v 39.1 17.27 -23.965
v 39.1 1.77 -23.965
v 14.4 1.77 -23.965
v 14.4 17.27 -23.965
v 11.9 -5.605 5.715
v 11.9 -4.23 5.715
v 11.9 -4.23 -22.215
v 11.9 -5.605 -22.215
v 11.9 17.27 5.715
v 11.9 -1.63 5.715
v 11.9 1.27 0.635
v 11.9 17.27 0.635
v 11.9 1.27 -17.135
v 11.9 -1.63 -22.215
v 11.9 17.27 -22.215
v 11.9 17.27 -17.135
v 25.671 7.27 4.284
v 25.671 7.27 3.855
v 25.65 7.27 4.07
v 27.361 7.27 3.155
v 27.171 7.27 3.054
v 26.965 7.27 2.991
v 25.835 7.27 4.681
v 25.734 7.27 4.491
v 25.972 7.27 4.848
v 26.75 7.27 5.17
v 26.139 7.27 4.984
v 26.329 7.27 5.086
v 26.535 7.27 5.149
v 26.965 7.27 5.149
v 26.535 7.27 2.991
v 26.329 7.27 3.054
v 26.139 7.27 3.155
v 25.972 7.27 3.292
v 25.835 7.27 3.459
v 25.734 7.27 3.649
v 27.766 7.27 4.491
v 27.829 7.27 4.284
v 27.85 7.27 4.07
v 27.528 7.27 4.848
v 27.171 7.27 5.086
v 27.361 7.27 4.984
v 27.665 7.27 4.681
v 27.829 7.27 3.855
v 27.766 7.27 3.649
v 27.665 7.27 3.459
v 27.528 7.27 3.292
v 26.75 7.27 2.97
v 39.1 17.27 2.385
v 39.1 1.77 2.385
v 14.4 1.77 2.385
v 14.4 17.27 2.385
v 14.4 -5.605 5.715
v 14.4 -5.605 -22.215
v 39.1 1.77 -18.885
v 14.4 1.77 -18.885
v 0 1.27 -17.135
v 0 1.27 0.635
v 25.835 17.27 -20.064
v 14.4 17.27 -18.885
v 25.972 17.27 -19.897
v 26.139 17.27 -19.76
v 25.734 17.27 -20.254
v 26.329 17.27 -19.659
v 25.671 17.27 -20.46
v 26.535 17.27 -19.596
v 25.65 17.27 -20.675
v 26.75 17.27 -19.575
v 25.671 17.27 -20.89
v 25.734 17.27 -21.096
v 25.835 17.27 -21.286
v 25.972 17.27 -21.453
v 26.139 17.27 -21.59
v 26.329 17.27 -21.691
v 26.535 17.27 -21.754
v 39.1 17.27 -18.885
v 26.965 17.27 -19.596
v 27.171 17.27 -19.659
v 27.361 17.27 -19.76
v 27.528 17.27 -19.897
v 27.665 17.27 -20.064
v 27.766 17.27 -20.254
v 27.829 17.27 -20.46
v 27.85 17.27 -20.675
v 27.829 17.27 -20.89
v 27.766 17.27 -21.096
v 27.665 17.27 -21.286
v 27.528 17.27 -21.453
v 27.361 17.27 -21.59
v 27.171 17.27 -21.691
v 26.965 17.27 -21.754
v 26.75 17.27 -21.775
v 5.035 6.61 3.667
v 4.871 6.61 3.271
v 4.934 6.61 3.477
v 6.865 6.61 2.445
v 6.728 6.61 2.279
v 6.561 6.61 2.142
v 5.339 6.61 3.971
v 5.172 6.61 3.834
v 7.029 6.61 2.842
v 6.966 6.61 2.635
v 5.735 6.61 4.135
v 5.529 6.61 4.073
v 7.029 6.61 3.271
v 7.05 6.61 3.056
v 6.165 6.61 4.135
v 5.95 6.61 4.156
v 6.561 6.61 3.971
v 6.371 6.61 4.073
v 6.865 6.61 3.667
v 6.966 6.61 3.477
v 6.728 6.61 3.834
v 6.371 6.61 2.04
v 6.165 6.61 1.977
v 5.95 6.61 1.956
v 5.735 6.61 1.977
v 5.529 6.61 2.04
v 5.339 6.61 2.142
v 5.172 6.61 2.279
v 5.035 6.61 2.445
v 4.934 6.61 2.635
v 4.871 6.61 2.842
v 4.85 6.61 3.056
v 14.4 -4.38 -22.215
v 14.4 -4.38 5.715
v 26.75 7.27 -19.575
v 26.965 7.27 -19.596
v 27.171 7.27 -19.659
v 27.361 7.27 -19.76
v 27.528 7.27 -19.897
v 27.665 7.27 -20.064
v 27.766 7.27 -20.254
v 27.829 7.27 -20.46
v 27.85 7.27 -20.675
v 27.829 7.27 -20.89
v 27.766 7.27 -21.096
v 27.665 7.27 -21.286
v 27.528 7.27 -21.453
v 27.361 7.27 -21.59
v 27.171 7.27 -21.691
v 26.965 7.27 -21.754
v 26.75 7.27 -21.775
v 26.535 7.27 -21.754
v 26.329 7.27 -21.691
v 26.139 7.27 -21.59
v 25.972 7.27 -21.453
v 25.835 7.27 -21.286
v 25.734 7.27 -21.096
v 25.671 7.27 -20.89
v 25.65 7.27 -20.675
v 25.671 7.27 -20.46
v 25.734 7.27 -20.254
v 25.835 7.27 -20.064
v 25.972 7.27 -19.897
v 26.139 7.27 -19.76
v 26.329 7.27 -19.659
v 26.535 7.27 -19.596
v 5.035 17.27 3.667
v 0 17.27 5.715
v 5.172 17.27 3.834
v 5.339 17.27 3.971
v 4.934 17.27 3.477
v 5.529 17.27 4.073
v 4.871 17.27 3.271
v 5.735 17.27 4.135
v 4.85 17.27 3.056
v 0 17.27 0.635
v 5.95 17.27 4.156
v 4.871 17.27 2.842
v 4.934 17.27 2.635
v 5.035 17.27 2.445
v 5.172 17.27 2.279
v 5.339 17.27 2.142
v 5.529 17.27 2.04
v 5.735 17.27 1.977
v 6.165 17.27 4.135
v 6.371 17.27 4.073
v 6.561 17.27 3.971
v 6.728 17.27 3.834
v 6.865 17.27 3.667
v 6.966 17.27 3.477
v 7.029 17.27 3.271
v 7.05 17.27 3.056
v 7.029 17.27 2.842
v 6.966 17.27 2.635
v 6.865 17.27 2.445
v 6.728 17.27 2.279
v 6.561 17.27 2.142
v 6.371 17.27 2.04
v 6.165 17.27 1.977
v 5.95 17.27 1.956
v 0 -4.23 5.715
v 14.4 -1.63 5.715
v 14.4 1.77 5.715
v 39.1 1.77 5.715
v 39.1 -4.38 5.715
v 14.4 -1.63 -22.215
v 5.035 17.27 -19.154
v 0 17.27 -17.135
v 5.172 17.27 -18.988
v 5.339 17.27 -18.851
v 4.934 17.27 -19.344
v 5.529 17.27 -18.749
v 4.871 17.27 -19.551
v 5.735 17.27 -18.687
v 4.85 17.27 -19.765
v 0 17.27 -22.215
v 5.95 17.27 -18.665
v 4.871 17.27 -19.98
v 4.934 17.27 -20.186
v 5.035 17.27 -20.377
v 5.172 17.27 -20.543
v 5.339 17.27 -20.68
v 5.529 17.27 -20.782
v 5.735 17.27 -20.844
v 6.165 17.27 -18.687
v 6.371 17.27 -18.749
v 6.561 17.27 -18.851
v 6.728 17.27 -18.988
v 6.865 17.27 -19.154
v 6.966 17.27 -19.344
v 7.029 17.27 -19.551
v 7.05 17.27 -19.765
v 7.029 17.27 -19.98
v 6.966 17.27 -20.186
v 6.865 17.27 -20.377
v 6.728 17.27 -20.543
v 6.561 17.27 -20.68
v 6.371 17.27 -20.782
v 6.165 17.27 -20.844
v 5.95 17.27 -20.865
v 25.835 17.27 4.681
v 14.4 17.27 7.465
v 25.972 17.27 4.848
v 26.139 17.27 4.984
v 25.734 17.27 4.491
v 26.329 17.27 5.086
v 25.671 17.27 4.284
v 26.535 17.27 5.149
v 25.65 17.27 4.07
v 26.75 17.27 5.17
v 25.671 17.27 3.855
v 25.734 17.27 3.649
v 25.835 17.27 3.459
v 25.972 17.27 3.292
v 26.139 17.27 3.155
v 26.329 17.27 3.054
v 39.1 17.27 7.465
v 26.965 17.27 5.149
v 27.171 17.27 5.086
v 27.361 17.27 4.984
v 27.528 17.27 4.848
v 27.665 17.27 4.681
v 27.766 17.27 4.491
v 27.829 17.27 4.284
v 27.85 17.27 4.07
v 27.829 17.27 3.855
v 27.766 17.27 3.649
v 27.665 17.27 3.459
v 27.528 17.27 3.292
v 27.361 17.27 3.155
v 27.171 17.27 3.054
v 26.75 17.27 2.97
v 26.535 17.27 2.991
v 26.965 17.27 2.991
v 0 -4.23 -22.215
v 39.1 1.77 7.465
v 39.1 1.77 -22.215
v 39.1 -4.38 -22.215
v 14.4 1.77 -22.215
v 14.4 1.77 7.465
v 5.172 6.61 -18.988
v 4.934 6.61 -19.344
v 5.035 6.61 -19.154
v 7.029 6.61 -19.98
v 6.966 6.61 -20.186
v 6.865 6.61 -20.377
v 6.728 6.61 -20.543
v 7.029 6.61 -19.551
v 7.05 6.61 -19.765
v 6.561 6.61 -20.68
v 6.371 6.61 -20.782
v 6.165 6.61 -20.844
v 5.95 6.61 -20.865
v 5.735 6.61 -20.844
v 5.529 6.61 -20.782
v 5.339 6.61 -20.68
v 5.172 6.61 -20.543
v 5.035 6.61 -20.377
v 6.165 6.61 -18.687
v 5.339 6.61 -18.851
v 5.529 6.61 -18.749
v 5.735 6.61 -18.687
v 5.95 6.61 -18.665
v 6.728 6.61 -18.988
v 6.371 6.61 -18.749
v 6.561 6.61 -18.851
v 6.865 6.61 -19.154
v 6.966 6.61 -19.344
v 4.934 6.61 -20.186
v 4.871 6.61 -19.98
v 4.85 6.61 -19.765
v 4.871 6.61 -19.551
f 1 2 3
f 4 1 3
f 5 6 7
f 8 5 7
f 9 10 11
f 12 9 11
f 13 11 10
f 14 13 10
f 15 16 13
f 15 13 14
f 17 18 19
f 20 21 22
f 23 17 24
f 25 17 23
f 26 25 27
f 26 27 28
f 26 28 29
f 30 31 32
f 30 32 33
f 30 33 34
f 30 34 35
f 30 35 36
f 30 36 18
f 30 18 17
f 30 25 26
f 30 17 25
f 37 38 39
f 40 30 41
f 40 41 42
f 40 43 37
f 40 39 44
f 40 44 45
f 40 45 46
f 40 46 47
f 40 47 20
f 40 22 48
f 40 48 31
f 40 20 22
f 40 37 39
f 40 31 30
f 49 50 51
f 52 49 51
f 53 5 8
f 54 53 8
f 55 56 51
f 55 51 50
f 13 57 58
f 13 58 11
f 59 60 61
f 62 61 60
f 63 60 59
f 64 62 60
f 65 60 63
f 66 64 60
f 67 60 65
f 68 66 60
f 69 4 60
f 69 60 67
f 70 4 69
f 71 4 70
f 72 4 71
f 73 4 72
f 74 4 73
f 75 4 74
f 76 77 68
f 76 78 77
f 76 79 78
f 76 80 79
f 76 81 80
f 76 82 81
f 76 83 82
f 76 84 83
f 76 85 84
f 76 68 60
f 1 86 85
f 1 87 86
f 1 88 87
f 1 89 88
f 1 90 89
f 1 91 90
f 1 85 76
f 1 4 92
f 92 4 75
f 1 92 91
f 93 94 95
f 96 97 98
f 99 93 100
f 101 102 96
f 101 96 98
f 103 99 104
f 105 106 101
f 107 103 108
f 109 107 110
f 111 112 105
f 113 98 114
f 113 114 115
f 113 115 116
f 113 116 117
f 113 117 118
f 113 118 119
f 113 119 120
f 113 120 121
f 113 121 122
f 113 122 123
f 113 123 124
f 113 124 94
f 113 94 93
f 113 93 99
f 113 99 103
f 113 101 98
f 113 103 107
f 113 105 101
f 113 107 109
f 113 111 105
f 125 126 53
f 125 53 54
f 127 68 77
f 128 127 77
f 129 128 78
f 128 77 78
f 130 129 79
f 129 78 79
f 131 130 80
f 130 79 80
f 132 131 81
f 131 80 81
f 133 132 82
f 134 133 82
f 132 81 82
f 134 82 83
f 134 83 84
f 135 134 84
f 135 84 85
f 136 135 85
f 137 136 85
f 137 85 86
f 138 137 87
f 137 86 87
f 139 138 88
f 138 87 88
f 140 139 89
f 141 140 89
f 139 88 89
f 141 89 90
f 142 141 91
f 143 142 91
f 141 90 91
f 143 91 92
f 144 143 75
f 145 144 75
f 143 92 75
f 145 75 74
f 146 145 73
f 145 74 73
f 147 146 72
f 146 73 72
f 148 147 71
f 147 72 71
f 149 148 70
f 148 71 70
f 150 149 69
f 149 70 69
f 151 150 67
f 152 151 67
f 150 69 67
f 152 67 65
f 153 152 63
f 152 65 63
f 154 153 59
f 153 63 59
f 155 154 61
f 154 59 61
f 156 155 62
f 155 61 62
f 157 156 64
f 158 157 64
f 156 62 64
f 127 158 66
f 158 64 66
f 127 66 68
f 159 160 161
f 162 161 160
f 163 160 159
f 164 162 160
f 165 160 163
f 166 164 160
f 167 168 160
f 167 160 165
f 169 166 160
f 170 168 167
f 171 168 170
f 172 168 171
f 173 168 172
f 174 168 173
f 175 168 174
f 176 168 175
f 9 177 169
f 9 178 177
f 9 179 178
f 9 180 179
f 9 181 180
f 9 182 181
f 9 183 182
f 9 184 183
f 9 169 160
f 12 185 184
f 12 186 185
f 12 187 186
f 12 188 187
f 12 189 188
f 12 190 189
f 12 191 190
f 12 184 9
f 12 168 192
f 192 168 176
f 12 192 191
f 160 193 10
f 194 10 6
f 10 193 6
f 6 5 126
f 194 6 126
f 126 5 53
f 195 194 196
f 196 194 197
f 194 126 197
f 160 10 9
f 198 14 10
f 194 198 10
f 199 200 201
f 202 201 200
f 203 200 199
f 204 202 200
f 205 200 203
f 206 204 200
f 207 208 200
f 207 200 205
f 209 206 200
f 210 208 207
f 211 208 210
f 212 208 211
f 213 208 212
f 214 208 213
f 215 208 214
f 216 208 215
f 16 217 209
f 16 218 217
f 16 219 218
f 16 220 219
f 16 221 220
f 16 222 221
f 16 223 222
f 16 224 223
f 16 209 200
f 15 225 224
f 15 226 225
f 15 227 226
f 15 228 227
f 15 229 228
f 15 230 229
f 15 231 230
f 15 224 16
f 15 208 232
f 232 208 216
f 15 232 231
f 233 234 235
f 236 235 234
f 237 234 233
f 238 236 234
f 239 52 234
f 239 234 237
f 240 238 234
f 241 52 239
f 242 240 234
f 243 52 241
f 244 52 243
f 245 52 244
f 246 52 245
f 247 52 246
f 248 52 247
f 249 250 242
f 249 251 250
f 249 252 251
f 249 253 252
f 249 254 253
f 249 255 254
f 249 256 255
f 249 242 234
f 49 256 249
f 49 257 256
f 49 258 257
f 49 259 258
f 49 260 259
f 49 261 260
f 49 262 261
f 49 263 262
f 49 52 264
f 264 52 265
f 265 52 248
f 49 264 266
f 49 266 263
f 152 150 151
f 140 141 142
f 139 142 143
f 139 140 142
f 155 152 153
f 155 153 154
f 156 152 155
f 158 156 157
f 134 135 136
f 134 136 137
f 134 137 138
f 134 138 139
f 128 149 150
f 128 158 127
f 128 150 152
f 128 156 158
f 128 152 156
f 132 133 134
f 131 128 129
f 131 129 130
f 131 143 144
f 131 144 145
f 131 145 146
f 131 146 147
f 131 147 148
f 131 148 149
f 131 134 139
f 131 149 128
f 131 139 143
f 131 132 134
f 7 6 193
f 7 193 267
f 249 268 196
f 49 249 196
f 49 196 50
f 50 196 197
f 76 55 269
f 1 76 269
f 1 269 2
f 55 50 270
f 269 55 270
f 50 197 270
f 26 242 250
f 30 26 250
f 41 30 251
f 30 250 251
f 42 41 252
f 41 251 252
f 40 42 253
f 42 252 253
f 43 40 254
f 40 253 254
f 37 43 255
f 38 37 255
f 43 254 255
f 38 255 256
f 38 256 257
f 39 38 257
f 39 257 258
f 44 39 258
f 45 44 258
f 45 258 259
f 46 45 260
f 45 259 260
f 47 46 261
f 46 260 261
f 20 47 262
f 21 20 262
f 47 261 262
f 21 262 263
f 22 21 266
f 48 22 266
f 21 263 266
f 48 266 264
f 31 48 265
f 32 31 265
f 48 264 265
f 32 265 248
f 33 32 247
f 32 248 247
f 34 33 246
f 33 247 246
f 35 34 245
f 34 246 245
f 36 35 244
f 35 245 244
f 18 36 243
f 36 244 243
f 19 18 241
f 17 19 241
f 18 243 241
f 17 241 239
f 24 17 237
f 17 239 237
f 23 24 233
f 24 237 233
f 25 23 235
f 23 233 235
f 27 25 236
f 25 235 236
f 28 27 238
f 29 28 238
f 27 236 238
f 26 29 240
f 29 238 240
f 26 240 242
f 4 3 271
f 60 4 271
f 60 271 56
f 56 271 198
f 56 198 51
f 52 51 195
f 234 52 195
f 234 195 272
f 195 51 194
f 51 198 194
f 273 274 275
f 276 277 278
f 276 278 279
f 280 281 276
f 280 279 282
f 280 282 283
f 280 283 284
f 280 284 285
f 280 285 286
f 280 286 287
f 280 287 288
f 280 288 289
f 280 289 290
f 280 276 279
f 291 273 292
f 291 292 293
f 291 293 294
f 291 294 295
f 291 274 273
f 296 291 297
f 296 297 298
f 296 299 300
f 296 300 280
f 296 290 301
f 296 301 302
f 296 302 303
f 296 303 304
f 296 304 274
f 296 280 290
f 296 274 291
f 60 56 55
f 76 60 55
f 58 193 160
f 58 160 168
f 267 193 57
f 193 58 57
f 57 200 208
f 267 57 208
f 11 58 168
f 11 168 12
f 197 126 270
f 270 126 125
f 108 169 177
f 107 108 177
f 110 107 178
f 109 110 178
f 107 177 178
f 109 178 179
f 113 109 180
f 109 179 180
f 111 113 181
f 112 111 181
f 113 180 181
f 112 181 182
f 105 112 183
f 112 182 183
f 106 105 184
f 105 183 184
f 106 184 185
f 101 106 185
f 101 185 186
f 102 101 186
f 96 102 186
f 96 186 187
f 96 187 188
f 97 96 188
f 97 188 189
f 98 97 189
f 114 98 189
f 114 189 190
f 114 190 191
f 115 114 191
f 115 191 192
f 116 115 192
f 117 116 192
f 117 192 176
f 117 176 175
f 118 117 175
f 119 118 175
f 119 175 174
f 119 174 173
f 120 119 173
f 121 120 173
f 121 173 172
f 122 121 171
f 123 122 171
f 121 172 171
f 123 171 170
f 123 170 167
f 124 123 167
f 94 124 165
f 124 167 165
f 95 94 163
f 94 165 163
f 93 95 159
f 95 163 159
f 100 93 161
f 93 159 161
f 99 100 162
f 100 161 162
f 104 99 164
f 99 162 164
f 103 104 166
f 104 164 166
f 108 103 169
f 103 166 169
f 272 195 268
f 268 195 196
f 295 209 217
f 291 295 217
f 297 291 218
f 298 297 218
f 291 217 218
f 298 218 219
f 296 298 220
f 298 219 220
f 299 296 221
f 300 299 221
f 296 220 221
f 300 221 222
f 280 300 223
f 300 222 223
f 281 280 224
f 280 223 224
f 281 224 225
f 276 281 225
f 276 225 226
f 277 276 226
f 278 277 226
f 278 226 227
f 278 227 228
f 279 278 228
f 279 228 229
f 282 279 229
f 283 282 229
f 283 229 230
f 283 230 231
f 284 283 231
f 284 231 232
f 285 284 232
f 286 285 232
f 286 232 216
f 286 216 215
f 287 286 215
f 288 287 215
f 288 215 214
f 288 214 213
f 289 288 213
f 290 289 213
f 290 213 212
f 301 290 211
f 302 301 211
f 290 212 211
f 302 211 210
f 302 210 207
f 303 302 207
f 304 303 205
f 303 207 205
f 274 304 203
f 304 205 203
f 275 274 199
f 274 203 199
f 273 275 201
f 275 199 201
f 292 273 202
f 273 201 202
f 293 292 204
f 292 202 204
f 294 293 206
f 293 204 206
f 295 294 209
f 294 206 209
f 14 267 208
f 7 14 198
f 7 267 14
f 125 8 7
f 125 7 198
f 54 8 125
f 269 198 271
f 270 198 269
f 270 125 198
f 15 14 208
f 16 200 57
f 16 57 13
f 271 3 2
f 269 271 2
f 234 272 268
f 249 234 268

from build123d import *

# Parameters (mm, degrees)
SKETCH1_W            = 11.9
SKETCH1_H            = 27.93
BOSS_EXTRUDE1_DEPTH  = 1.27
SKETCH1_3_W          = 11.9
SKETCH1_3_H          = 5.08
BOSS_EXTRUDE2_DEPTH  = 16.77
SKETCH2_R            = 1.1
CUT_EXTRUDE1_DEPTH   = 10.16
SKETCH3_R            = 1.1
CUT_EXTRUDE2_DEPTH   = 10.16
SKETCH4_W            = 27.93
SKETCH4_H            = 1.48
BOSS_EXTRUDE4_DEPTH  = 11.9
SKETCH6_W            = 27.93
SKETCH6_H            = 2.75
BOSS_EXTRUDE5_DEPTH  = 11.9
SKETCH7_W            = 27.93
SKETCH7_H            = 2.75
BOSS_EXTRUDE6_DEPTH  = 2.5
BOSS_EXTRUDE7_DEPTH  = 2.5
BOSS_EXTRUDE13_START = 0.5
SKETCH19_W           = 11.9
SKETCH19_H           = 5.08
SKETCH19_R           = 1.1
BOSS_EXTRUDE13_DEPTH = 0.5
BOSS_EXTRUDE14_DEPTH = 24.7
SKETCH21_W           = 24.7
SKETCH21_H           = 27.93
BOSS_EXTRUDE16_DEPTH = 0.5
SKETCH23_W           = 24.7
SKETCH23_H           = 5.08
BOSS_EXTRUDE17_DEPTH = 15.5
SKETCH24_R           = 1.1
CUT_EXTRUDE3_DEPTH   = 10


with BuildPart() as part:
    # Sketch1 → Boss-Extrude1 (new body)
    with BuildSketch(Plane(origin=(0, 0, 0), x_dir=(1, 0, 0), z_dir=(0, 1, 0))):
        with Locations((5.95, 8.25)):
            Rectangle(SKETCH1_W, SKETCH1_H)
    extrude(amount=BOSS_EXTRUDE1_DEPTH)

    # Sketch1<3> → Boss-Extrude2 (add)
    with BuildSketch(Plane(origin=(0, 0, 0), x_dir=(1, 0, 0), z_dir=(0, 1, 0))):
        with Locations((5.95, 19.675)):
            Rectangle(SKETCH1_3_W, SKETCH1_3_H)
        with Locations((5.95, -3.175)):
            Rectangle(SKETCH1_3_W, SKETCH1_3_H)
    extrude(amount=BOSS_EXTRUDE2_DEPTH)

    # Sketch2 → Cut-Extrude1 (cut)
    with BuildSketch(Plane(origin=(0, 16.77, 0), x_dir=(1, 0, 0), z_dir=(0, 1, 0))):
        with Locations((5.95, 19.765430595)):
            Circle(SKETCH2_R)
    extrude(amount=-CUT_EXTRUDE1_DEPTH, mode=Mode.SUBTRACT)

    # Sketch3 → Cut-Extrude2 (cut)
    with BuildSketch(Plane(origin=(0, 16.77, 0), x_dir=(1, 0, 0), z_dir=(0, 1, 0))):
        with Locations((5.95, -3.056330688)):
            Circle(SKETCH3_R)
    extrude(amount=-CUT_EXTRUDE2_DEPTH, mode=Mode.SUBTRACT)

    # Sketch4 → Boss-Extrude4 (add)
    with BuildSketch(Plane(origin=(11.9, 0, 0), x_dir=(0, 0, -1), z_dir=(1, 0, 0))):
        with Locations((8.25, -0.74)):
            Rectangle(SKETCH4_W, SKETCH4_H)
    extrude(amount=-BOSS_EXTRUDE4_DEPTH)

    # Sketch6 → Boss-Extrude5 (add)
    with BuildSketch(Plane(origin=(11.9, 0, 0), x_dir=(0, 0, -1), z_dir=(1, 0, 0))):
        with Locations((8.25, -2.855)):
            Rectangle(SKETCH6_W, SKETCH6_H)
    extrude(amount=-BOSS_EXTRUDE5_DEPTH)

    # Sketch7 → Boss-Extrude6 (add)
    with BuildSketch(Plane(origin=(11.9, 0, 0), x_dir=(0, 0, -1), z_dir=(1, 0, 0))):
        with Locations((8.25, -4.23)):
            Rectangle(SKETCH7_W, SKETCH7_H)
    extrude(amount=BOSS_EXTRUDE6_DEPTH)

    # Sketch8 → Boss-Extrude7 (add)
    with BuildSketch(Plane(origin=(11.9, 0, 0), x_dir=(0, 0, -1), z_dir=(1, 0, 0))):
        Polygon((22.215, -1.63), (-0.635, -1.63), (-5.715, -1.63), (-5.715, -2.855), (22.215, -2.855), align=None)
    extrude(amount=BOSS_EXTRUDE7_DEPTH)

    # Sketch19 → Boss-Extrude13 (add)
    # profile 1 of 2: a face of its own
    with BuildSketch(Plane(origin=(0, 16.77, 0), x_dir=(1, 0, 0), z_dir=(0, 1, 0)).offset(BOSS_EXTRUDE13_START)):
        with Locations((5.95, 19.675)):
            Rectangle(SKETCH19_W, SKETCH19_H)
        with Locations((5.95, 19.765430595)):
            Circle(SKETCH19_R, mode=Mode.SUBTRACT)
    # profile 2 of 2: a face of its own
    with BuildSketch(Plane(origin=(0, 16.77, 0), x_dir=(1, 0, 0), z_dir=(0, 1, 0)).offset(BOSS_EXTRUDE13_START)):
        with Locations((5.95, -3.175)):
            Rectangle(SKETCH19_W, SKETCH19_H)
        with Locations((5.95, -3.056330688)):
            Circle(SKETCH19_R, mode=Mode.SUBTRACT)
    extrude(amount=-BOSS_EXTRUDE13_DEPTH)

    # Sketch20 → Boss-Extrude14 (add)
    with BuildSketch(Plane(origin=(14.4, 0, 0), x_dir=(0, 0, -1), z_dir=(1, 0, 0))):
        Polygon((-5.715, -1.63), (-5.715, -4.38), (22.215, -4.38), (22.215, -3.6175), (22.215, 1.27), (-5.715, 1.27), align=None)
    extrude(amount=BOSS_EXTRUDE14_DEPTH)

    # Sketch21 → Boss-Extrude16 (add)
    with BuildSketch(Plane(origin=(0, 1.27, 0), x_dir=(1, 0, 0), z_dir=(0, 1, 0))):
        with Locations((26.75, 8.25)):
            Rectangle(SKETCH21_W, SKETCH21_H)
    extrude(amount=BOSS_EXTRUDE16_DEPTH)

    # Sketch23 → Boss-Extrude17 (add)
    with BuildSketch(Plane(origin=(0, 1.77, 0), x_dir=(1, 0, 0), z_dir=(0, 1, 0))):
        with Locations((26.75, 21.425)):
            Rectangle(SKETCH23_W, SKETCH23_H)
        with Locations((26.75, -4.925)):
            Rectangle(SKETCH23_W, SKETCH23_H)
    extrude(amount=BOSS_EXTRUDE17_DEPTH)

    # Sketch24 → Cut-Extrude3 (cut)
    with BuildSketch(Plane(origin=(0, 17.27, 0), x_dir=(1, 0, 0), z_dir=(0, 1, 0))):
        with Locations((26.75, -4.069787702)):
            Circle(SKETCH24_R)
        with Locations((26.75, 20.675)):
            Circle(SKETCH24_R)
    extrude(amount=-CUT_EXTRUDE3_DEPTH, mode=Mode.SUBTRACT)


solid = part.part
